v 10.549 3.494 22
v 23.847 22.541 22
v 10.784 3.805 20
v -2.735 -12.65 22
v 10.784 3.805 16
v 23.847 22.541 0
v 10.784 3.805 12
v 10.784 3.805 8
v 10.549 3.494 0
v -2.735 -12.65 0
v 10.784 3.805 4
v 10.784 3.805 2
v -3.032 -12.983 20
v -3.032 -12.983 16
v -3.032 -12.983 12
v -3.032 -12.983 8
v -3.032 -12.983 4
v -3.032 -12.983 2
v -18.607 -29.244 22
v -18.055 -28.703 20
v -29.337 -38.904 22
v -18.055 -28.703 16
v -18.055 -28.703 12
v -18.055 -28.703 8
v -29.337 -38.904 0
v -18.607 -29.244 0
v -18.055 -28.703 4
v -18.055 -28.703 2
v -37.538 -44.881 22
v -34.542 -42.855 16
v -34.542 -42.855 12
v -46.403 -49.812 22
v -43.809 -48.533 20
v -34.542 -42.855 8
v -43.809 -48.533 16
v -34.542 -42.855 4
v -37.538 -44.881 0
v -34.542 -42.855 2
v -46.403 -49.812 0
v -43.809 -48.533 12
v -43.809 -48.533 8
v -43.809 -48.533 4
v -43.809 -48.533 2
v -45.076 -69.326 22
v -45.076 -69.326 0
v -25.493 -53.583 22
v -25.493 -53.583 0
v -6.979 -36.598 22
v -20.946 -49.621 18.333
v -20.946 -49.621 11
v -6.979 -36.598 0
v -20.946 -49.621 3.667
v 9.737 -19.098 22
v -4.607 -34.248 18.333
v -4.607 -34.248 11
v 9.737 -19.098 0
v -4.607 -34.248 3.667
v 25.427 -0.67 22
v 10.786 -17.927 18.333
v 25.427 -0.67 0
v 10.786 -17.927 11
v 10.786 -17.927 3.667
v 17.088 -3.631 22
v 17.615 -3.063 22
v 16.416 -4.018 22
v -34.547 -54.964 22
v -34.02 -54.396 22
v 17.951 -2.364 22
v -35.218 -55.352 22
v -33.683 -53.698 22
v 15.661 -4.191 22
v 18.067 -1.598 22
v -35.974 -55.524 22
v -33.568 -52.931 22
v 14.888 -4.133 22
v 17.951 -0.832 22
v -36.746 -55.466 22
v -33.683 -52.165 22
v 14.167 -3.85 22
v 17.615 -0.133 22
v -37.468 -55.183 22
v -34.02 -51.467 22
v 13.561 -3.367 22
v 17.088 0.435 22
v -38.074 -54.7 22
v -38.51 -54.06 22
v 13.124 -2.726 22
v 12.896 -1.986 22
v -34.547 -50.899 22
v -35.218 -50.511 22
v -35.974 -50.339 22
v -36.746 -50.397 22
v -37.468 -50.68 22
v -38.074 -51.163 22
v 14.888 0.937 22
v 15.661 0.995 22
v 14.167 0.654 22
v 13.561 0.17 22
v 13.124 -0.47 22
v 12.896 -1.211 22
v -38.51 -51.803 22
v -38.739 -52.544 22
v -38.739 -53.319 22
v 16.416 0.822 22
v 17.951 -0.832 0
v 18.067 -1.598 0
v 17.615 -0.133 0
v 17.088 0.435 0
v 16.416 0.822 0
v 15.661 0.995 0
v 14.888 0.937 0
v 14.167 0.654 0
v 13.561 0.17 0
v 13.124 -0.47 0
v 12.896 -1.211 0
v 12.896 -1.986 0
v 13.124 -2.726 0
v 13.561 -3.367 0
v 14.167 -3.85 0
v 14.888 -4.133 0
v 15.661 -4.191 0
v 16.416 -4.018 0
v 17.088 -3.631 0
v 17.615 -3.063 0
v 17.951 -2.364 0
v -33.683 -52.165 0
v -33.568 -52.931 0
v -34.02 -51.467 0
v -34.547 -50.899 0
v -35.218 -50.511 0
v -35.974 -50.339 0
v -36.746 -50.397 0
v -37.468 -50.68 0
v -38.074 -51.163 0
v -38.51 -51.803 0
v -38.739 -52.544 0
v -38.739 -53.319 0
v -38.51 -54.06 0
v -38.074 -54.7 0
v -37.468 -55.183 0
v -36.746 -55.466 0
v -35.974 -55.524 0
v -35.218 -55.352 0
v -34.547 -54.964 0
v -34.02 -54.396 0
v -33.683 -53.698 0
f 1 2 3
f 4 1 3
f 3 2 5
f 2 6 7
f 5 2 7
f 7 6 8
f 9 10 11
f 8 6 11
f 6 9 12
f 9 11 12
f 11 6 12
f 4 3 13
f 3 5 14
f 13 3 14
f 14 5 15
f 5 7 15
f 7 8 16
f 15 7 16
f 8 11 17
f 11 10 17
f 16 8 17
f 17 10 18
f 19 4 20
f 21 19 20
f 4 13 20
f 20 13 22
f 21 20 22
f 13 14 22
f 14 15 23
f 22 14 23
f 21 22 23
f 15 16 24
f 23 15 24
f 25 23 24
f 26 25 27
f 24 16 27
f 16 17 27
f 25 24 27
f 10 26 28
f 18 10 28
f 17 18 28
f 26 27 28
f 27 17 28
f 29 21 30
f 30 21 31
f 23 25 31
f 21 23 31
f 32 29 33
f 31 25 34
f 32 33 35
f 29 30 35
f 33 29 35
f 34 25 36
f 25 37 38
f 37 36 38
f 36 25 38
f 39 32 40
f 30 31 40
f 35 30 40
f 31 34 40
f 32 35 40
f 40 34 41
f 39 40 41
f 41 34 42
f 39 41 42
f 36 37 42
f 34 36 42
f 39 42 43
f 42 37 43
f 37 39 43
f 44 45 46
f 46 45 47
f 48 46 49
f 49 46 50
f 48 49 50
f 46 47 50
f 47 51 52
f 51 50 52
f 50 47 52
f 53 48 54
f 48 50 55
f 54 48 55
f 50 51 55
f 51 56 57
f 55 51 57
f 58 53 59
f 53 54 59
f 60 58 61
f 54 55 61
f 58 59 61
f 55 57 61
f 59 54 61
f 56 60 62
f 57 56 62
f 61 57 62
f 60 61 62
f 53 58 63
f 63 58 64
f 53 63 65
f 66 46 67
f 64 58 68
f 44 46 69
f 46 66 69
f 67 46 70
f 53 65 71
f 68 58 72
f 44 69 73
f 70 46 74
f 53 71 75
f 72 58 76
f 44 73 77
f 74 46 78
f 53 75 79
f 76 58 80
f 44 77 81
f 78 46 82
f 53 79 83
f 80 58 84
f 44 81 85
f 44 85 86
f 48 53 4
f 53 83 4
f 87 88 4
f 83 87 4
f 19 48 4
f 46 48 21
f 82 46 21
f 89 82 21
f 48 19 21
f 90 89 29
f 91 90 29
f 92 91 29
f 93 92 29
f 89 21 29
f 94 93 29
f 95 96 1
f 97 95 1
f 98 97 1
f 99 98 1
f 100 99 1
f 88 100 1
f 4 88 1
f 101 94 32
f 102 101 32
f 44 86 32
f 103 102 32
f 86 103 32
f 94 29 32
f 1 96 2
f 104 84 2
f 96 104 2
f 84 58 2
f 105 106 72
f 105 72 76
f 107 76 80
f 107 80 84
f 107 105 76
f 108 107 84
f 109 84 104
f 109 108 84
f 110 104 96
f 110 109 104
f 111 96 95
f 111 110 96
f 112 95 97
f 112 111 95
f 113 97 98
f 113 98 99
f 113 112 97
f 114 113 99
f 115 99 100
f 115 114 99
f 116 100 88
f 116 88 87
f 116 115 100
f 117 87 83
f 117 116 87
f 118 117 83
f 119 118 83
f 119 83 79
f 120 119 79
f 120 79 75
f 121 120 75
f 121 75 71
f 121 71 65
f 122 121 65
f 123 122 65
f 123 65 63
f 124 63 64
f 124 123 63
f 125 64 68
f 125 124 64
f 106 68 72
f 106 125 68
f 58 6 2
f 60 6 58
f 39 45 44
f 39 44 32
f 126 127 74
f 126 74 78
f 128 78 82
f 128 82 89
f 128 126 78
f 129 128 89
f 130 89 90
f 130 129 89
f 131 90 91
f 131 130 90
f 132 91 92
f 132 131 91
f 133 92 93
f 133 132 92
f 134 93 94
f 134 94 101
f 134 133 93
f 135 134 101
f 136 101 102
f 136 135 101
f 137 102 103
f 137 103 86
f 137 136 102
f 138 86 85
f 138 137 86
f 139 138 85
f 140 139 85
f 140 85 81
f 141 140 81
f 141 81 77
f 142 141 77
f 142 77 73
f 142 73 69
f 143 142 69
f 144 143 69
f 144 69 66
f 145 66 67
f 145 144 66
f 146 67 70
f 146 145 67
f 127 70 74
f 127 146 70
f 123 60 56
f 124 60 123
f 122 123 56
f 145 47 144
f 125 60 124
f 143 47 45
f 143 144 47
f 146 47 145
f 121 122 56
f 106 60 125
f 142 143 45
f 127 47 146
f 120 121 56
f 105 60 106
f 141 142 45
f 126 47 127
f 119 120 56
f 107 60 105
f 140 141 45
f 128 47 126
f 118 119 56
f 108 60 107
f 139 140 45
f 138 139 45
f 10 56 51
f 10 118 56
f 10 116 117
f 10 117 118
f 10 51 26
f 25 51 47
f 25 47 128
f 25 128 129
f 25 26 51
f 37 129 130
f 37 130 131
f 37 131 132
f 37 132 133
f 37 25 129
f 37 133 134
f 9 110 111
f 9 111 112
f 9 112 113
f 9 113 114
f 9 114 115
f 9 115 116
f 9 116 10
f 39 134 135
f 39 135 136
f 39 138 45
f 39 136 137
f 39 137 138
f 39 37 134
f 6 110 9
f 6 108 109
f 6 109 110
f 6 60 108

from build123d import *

# Parameters (mm, degrees)
SKETCH_1_R      = 2.6
EXTRUDE_1_DEPTH = 22


with BuildPart() as part:
    # 草图1 → 凸台-拉伸1 (new body)
    with BuildSketch(Plane.XY):
        with BuildLine():
            Line((23.847340939, 22.540535696), (25.426595378, -0.670423871))
            add(Edge.make_bspline(
                [(-45.075558205, -69.325666874), (-42.754308832, -67.574416213), (-40.451669282, -65.798512541), (-32.294309234, -59.368468615), (-26.546100007, -54.578255108), (-15.345136182, -44.664021117), (-9.895646996, -39.536602487), (0.681335287, -28.95909339), (5.808236447, -23.509575428), (15.763503709, -12.344368812), (20.592346629, -6.630730984), (25.344702666, -0.771444989), (25.385653413, -0.720937959), (25.426595378, -0.670423871)],
                knots=[0.201401882, 0.201401882, 0.201401882, 0.201401882, 0.25, 0.25, 0.375, 0.375, 0.5, 0.5, 0.625, 0.625, 0.75, 0.75, 0.751086715, 0.751086715, 0.751086715, 0.751086715], degree=3))
            Line((-45.075558205, -69.325666874), (-46.403218206, -49.812495445))
            add(Edge.make_bspline(
                [(23.847340939, 22.540535696), (23.64915353, 22.233291982), (23.450485571, 21.926356885), (19.302193238, 15.53957719), (15.159702589, 9.585176101), (8.596754946, 0.915295883), (6.3513379, -1.931247492), (1.744627248, -7.528266651), (-0.617237974, -10.279137899), (-5.445852464, -15.685888726), (-7.913195994, -18.342470215), (-11.674958808, -22.267979722), (-12.938982587, -23.567073503), (-15.483103595, -26.149104874), (-16.762445153, -27.432760042), (-20.640021965, -31.243741747), (-23.278577451, -33.732226441), (-28.749348744, -38.491244165), (-31.58193298, -40.761476786), (-37.50215526, -44.948079537), (-40.590801141, -46.863006315), (-44.66457019, -48.977283832), (-45.52963212, -49.403999667), (-46.403218206, -49.812495445)],
                knots=[0.243696274, 0.243696274, 0.243696274, 0.243696274, 0.25, 0.25, 0.375, 0.375, 0.4375, 0.4375, 0.5, 0.5, 0.5625, 0.5625, 0.59375, 0.59375, 0.625, 0.625, 0.6875, 0.6875, 0.75, 0.75, 0.8125, 0.8125, 0.829122533, 0.829122533, 0.829122533, 0.829122533], degree=3))
        make_face()
        with Locations((-36.167886121, -52.931465967)):
            Circle(SKETCH_1_R, mode=Mode.SUBTRACT)
        with Locations((15.466595378, -1.598123556)):
            Circle(SKETCH_1_R, mode=Mode.SUBTRACT)
    extrude(amount=EXTRUDE_1_DEPTH)


solid = part.part
